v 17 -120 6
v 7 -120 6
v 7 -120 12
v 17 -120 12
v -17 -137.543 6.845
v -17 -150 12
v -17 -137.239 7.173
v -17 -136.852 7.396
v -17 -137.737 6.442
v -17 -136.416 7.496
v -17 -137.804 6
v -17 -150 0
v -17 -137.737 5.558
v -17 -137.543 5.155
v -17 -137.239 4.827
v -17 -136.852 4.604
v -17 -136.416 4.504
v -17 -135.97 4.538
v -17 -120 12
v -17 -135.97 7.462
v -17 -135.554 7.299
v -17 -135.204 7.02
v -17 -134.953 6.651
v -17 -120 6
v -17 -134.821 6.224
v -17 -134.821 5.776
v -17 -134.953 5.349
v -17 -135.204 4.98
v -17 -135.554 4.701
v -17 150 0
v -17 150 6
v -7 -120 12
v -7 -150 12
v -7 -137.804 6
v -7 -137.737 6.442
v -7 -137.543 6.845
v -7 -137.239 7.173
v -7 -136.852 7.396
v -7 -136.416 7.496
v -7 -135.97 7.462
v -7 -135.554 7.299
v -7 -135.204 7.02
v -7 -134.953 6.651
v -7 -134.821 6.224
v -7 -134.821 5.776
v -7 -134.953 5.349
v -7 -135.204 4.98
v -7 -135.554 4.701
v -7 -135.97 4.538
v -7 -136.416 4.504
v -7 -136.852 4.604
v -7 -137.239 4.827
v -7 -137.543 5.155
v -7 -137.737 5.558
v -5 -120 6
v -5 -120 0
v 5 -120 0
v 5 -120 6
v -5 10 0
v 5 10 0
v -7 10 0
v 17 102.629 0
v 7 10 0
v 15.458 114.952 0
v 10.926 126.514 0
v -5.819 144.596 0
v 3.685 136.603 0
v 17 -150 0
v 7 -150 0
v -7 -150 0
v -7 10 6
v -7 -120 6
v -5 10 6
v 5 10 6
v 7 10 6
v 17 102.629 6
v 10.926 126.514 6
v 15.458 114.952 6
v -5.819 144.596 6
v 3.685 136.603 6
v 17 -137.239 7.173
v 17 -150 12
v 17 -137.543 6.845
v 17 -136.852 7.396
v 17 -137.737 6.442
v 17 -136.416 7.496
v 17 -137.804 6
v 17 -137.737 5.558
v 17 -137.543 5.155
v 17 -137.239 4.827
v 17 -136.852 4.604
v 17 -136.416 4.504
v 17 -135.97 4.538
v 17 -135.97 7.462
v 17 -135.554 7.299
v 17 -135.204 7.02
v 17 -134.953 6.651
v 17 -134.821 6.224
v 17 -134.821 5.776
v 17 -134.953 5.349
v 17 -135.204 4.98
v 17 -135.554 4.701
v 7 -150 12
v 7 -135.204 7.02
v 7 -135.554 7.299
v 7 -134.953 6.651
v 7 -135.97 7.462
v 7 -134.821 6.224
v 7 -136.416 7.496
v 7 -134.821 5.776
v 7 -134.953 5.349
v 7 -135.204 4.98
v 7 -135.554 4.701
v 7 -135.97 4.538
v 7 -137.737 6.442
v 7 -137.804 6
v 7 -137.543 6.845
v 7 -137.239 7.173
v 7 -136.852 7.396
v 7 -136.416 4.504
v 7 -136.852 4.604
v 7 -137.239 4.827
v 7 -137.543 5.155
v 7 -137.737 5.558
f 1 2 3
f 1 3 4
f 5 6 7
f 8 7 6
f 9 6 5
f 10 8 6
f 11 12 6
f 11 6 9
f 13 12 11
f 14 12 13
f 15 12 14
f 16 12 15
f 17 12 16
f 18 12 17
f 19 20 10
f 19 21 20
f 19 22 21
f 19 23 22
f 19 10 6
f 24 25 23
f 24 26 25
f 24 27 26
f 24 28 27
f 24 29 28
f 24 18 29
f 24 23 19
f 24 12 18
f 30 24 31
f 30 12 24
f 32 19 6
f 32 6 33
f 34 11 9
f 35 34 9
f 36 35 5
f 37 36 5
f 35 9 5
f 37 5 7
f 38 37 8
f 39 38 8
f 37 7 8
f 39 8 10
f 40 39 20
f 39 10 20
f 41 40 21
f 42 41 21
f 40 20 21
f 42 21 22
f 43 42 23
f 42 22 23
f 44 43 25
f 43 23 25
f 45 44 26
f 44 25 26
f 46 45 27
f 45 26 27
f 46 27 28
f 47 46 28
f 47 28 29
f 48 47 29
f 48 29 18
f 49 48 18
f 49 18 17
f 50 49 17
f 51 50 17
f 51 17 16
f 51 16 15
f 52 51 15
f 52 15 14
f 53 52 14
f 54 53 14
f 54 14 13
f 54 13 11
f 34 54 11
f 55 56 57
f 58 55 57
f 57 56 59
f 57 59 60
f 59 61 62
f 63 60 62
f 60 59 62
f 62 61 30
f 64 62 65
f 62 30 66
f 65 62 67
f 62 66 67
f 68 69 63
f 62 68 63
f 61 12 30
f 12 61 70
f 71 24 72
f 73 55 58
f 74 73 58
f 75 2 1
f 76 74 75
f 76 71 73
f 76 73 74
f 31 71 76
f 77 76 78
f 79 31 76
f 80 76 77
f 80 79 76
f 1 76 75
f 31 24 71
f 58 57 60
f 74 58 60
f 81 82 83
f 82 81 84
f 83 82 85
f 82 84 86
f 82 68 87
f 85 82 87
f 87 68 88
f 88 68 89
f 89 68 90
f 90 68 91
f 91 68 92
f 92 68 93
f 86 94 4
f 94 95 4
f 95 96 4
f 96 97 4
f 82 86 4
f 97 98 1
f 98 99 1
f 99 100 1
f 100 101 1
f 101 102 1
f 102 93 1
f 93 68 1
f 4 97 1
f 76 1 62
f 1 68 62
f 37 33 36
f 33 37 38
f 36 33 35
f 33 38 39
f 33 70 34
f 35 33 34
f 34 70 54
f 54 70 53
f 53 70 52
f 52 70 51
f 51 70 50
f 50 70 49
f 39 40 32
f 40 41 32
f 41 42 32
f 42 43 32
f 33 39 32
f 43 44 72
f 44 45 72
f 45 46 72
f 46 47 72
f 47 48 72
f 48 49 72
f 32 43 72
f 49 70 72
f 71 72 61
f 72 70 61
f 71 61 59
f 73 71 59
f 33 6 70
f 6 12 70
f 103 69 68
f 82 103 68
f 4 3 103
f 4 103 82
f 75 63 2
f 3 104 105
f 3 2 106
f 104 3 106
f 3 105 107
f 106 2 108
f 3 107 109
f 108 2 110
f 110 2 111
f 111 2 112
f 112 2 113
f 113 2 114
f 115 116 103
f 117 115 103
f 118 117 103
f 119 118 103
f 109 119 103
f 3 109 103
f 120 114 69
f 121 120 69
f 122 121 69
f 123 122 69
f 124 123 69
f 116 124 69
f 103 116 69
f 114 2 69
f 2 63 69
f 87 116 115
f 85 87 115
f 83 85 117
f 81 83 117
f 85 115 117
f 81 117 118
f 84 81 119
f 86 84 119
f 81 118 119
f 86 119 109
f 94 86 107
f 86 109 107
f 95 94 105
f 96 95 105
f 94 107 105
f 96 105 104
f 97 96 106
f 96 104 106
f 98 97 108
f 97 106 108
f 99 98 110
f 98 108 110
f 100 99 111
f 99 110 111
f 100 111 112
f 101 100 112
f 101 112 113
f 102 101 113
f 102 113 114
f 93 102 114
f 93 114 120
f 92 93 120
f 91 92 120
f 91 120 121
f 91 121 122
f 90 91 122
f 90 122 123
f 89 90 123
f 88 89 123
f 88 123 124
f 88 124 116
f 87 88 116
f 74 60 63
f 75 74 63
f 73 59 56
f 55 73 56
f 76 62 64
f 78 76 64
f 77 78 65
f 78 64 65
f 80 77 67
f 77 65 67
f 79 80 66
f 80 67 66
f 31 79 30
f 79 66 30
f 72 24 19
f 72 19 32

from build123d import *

# Parameters (mm, degrees)
F1_DEPTH    = 6
F2_W        = 10
F2_H        = 30
F3_DEPTH    = 6
F4_R        = 1.5
F5_DEPTH    = 34.001
F6_T1_DEPTH = 242.8543856465


# Not quite as in the source:
# - a fillet or chamfer that OpenCascade refuses, or shapes differently, is made with other operations: its cross-section is extruded or revolved along the edge and cut away or added


with BuildPart() as f1:
    # F0 (on Top) → F1 (new body)
    with BuildSketch(Plane.XY):
        Polygon((7, -150), (17, -150), (17, 150), (-17, 150), (-17, -150), (-7, -150), (-7, 10), (-5, 10), (-5, -120), (5, -120), (5, 10), (7, 10), align=None)
    extrude(amount=F1_DEPTH)

    # F2 (on face) → F3 (join)
    with BuildSketch(Plane.XY.offset(6)):
        with Locations((-12, -135)):
            Rectangle(F2_W, F2_H)
        with Locations((12, -135)):
            Rectangle(F2_W, F2_H)
    extrude(amount=F3_DEPTH)

    # F4 (on face) → F5 (cut, through all)
    with BuildSketch(Plane(origin=(-17, 0, 0), x_dir=(0, -1, 0), z_dir=(-1, 0, 0))):
        with Locations((136.3040655851, 6)):
            Circle(F4_R)
    extrude(amount=-F5_DEPTH, mode=Mode.SUBTRACT)

    # F6: fillet of radius 50 on 1 edges, made by hand

    # F6_s2 → F6_t1 (cut)
    with BuildSketch(Plane.XY.offset(-118.4271928233)):
        with BuildLine():
            ThreePointArc((17, 102.6291228707), (7.6201920232, 131.7838823449), (-17, 150))
            Line((-17, 150), (17, 150))
            Line((17, 150), (17, 102.6291228707))
        make_face()
    extrude(amount=F6_T1_DEPTH, mode=Mode.SUBTRACT)


solid = f1.part
